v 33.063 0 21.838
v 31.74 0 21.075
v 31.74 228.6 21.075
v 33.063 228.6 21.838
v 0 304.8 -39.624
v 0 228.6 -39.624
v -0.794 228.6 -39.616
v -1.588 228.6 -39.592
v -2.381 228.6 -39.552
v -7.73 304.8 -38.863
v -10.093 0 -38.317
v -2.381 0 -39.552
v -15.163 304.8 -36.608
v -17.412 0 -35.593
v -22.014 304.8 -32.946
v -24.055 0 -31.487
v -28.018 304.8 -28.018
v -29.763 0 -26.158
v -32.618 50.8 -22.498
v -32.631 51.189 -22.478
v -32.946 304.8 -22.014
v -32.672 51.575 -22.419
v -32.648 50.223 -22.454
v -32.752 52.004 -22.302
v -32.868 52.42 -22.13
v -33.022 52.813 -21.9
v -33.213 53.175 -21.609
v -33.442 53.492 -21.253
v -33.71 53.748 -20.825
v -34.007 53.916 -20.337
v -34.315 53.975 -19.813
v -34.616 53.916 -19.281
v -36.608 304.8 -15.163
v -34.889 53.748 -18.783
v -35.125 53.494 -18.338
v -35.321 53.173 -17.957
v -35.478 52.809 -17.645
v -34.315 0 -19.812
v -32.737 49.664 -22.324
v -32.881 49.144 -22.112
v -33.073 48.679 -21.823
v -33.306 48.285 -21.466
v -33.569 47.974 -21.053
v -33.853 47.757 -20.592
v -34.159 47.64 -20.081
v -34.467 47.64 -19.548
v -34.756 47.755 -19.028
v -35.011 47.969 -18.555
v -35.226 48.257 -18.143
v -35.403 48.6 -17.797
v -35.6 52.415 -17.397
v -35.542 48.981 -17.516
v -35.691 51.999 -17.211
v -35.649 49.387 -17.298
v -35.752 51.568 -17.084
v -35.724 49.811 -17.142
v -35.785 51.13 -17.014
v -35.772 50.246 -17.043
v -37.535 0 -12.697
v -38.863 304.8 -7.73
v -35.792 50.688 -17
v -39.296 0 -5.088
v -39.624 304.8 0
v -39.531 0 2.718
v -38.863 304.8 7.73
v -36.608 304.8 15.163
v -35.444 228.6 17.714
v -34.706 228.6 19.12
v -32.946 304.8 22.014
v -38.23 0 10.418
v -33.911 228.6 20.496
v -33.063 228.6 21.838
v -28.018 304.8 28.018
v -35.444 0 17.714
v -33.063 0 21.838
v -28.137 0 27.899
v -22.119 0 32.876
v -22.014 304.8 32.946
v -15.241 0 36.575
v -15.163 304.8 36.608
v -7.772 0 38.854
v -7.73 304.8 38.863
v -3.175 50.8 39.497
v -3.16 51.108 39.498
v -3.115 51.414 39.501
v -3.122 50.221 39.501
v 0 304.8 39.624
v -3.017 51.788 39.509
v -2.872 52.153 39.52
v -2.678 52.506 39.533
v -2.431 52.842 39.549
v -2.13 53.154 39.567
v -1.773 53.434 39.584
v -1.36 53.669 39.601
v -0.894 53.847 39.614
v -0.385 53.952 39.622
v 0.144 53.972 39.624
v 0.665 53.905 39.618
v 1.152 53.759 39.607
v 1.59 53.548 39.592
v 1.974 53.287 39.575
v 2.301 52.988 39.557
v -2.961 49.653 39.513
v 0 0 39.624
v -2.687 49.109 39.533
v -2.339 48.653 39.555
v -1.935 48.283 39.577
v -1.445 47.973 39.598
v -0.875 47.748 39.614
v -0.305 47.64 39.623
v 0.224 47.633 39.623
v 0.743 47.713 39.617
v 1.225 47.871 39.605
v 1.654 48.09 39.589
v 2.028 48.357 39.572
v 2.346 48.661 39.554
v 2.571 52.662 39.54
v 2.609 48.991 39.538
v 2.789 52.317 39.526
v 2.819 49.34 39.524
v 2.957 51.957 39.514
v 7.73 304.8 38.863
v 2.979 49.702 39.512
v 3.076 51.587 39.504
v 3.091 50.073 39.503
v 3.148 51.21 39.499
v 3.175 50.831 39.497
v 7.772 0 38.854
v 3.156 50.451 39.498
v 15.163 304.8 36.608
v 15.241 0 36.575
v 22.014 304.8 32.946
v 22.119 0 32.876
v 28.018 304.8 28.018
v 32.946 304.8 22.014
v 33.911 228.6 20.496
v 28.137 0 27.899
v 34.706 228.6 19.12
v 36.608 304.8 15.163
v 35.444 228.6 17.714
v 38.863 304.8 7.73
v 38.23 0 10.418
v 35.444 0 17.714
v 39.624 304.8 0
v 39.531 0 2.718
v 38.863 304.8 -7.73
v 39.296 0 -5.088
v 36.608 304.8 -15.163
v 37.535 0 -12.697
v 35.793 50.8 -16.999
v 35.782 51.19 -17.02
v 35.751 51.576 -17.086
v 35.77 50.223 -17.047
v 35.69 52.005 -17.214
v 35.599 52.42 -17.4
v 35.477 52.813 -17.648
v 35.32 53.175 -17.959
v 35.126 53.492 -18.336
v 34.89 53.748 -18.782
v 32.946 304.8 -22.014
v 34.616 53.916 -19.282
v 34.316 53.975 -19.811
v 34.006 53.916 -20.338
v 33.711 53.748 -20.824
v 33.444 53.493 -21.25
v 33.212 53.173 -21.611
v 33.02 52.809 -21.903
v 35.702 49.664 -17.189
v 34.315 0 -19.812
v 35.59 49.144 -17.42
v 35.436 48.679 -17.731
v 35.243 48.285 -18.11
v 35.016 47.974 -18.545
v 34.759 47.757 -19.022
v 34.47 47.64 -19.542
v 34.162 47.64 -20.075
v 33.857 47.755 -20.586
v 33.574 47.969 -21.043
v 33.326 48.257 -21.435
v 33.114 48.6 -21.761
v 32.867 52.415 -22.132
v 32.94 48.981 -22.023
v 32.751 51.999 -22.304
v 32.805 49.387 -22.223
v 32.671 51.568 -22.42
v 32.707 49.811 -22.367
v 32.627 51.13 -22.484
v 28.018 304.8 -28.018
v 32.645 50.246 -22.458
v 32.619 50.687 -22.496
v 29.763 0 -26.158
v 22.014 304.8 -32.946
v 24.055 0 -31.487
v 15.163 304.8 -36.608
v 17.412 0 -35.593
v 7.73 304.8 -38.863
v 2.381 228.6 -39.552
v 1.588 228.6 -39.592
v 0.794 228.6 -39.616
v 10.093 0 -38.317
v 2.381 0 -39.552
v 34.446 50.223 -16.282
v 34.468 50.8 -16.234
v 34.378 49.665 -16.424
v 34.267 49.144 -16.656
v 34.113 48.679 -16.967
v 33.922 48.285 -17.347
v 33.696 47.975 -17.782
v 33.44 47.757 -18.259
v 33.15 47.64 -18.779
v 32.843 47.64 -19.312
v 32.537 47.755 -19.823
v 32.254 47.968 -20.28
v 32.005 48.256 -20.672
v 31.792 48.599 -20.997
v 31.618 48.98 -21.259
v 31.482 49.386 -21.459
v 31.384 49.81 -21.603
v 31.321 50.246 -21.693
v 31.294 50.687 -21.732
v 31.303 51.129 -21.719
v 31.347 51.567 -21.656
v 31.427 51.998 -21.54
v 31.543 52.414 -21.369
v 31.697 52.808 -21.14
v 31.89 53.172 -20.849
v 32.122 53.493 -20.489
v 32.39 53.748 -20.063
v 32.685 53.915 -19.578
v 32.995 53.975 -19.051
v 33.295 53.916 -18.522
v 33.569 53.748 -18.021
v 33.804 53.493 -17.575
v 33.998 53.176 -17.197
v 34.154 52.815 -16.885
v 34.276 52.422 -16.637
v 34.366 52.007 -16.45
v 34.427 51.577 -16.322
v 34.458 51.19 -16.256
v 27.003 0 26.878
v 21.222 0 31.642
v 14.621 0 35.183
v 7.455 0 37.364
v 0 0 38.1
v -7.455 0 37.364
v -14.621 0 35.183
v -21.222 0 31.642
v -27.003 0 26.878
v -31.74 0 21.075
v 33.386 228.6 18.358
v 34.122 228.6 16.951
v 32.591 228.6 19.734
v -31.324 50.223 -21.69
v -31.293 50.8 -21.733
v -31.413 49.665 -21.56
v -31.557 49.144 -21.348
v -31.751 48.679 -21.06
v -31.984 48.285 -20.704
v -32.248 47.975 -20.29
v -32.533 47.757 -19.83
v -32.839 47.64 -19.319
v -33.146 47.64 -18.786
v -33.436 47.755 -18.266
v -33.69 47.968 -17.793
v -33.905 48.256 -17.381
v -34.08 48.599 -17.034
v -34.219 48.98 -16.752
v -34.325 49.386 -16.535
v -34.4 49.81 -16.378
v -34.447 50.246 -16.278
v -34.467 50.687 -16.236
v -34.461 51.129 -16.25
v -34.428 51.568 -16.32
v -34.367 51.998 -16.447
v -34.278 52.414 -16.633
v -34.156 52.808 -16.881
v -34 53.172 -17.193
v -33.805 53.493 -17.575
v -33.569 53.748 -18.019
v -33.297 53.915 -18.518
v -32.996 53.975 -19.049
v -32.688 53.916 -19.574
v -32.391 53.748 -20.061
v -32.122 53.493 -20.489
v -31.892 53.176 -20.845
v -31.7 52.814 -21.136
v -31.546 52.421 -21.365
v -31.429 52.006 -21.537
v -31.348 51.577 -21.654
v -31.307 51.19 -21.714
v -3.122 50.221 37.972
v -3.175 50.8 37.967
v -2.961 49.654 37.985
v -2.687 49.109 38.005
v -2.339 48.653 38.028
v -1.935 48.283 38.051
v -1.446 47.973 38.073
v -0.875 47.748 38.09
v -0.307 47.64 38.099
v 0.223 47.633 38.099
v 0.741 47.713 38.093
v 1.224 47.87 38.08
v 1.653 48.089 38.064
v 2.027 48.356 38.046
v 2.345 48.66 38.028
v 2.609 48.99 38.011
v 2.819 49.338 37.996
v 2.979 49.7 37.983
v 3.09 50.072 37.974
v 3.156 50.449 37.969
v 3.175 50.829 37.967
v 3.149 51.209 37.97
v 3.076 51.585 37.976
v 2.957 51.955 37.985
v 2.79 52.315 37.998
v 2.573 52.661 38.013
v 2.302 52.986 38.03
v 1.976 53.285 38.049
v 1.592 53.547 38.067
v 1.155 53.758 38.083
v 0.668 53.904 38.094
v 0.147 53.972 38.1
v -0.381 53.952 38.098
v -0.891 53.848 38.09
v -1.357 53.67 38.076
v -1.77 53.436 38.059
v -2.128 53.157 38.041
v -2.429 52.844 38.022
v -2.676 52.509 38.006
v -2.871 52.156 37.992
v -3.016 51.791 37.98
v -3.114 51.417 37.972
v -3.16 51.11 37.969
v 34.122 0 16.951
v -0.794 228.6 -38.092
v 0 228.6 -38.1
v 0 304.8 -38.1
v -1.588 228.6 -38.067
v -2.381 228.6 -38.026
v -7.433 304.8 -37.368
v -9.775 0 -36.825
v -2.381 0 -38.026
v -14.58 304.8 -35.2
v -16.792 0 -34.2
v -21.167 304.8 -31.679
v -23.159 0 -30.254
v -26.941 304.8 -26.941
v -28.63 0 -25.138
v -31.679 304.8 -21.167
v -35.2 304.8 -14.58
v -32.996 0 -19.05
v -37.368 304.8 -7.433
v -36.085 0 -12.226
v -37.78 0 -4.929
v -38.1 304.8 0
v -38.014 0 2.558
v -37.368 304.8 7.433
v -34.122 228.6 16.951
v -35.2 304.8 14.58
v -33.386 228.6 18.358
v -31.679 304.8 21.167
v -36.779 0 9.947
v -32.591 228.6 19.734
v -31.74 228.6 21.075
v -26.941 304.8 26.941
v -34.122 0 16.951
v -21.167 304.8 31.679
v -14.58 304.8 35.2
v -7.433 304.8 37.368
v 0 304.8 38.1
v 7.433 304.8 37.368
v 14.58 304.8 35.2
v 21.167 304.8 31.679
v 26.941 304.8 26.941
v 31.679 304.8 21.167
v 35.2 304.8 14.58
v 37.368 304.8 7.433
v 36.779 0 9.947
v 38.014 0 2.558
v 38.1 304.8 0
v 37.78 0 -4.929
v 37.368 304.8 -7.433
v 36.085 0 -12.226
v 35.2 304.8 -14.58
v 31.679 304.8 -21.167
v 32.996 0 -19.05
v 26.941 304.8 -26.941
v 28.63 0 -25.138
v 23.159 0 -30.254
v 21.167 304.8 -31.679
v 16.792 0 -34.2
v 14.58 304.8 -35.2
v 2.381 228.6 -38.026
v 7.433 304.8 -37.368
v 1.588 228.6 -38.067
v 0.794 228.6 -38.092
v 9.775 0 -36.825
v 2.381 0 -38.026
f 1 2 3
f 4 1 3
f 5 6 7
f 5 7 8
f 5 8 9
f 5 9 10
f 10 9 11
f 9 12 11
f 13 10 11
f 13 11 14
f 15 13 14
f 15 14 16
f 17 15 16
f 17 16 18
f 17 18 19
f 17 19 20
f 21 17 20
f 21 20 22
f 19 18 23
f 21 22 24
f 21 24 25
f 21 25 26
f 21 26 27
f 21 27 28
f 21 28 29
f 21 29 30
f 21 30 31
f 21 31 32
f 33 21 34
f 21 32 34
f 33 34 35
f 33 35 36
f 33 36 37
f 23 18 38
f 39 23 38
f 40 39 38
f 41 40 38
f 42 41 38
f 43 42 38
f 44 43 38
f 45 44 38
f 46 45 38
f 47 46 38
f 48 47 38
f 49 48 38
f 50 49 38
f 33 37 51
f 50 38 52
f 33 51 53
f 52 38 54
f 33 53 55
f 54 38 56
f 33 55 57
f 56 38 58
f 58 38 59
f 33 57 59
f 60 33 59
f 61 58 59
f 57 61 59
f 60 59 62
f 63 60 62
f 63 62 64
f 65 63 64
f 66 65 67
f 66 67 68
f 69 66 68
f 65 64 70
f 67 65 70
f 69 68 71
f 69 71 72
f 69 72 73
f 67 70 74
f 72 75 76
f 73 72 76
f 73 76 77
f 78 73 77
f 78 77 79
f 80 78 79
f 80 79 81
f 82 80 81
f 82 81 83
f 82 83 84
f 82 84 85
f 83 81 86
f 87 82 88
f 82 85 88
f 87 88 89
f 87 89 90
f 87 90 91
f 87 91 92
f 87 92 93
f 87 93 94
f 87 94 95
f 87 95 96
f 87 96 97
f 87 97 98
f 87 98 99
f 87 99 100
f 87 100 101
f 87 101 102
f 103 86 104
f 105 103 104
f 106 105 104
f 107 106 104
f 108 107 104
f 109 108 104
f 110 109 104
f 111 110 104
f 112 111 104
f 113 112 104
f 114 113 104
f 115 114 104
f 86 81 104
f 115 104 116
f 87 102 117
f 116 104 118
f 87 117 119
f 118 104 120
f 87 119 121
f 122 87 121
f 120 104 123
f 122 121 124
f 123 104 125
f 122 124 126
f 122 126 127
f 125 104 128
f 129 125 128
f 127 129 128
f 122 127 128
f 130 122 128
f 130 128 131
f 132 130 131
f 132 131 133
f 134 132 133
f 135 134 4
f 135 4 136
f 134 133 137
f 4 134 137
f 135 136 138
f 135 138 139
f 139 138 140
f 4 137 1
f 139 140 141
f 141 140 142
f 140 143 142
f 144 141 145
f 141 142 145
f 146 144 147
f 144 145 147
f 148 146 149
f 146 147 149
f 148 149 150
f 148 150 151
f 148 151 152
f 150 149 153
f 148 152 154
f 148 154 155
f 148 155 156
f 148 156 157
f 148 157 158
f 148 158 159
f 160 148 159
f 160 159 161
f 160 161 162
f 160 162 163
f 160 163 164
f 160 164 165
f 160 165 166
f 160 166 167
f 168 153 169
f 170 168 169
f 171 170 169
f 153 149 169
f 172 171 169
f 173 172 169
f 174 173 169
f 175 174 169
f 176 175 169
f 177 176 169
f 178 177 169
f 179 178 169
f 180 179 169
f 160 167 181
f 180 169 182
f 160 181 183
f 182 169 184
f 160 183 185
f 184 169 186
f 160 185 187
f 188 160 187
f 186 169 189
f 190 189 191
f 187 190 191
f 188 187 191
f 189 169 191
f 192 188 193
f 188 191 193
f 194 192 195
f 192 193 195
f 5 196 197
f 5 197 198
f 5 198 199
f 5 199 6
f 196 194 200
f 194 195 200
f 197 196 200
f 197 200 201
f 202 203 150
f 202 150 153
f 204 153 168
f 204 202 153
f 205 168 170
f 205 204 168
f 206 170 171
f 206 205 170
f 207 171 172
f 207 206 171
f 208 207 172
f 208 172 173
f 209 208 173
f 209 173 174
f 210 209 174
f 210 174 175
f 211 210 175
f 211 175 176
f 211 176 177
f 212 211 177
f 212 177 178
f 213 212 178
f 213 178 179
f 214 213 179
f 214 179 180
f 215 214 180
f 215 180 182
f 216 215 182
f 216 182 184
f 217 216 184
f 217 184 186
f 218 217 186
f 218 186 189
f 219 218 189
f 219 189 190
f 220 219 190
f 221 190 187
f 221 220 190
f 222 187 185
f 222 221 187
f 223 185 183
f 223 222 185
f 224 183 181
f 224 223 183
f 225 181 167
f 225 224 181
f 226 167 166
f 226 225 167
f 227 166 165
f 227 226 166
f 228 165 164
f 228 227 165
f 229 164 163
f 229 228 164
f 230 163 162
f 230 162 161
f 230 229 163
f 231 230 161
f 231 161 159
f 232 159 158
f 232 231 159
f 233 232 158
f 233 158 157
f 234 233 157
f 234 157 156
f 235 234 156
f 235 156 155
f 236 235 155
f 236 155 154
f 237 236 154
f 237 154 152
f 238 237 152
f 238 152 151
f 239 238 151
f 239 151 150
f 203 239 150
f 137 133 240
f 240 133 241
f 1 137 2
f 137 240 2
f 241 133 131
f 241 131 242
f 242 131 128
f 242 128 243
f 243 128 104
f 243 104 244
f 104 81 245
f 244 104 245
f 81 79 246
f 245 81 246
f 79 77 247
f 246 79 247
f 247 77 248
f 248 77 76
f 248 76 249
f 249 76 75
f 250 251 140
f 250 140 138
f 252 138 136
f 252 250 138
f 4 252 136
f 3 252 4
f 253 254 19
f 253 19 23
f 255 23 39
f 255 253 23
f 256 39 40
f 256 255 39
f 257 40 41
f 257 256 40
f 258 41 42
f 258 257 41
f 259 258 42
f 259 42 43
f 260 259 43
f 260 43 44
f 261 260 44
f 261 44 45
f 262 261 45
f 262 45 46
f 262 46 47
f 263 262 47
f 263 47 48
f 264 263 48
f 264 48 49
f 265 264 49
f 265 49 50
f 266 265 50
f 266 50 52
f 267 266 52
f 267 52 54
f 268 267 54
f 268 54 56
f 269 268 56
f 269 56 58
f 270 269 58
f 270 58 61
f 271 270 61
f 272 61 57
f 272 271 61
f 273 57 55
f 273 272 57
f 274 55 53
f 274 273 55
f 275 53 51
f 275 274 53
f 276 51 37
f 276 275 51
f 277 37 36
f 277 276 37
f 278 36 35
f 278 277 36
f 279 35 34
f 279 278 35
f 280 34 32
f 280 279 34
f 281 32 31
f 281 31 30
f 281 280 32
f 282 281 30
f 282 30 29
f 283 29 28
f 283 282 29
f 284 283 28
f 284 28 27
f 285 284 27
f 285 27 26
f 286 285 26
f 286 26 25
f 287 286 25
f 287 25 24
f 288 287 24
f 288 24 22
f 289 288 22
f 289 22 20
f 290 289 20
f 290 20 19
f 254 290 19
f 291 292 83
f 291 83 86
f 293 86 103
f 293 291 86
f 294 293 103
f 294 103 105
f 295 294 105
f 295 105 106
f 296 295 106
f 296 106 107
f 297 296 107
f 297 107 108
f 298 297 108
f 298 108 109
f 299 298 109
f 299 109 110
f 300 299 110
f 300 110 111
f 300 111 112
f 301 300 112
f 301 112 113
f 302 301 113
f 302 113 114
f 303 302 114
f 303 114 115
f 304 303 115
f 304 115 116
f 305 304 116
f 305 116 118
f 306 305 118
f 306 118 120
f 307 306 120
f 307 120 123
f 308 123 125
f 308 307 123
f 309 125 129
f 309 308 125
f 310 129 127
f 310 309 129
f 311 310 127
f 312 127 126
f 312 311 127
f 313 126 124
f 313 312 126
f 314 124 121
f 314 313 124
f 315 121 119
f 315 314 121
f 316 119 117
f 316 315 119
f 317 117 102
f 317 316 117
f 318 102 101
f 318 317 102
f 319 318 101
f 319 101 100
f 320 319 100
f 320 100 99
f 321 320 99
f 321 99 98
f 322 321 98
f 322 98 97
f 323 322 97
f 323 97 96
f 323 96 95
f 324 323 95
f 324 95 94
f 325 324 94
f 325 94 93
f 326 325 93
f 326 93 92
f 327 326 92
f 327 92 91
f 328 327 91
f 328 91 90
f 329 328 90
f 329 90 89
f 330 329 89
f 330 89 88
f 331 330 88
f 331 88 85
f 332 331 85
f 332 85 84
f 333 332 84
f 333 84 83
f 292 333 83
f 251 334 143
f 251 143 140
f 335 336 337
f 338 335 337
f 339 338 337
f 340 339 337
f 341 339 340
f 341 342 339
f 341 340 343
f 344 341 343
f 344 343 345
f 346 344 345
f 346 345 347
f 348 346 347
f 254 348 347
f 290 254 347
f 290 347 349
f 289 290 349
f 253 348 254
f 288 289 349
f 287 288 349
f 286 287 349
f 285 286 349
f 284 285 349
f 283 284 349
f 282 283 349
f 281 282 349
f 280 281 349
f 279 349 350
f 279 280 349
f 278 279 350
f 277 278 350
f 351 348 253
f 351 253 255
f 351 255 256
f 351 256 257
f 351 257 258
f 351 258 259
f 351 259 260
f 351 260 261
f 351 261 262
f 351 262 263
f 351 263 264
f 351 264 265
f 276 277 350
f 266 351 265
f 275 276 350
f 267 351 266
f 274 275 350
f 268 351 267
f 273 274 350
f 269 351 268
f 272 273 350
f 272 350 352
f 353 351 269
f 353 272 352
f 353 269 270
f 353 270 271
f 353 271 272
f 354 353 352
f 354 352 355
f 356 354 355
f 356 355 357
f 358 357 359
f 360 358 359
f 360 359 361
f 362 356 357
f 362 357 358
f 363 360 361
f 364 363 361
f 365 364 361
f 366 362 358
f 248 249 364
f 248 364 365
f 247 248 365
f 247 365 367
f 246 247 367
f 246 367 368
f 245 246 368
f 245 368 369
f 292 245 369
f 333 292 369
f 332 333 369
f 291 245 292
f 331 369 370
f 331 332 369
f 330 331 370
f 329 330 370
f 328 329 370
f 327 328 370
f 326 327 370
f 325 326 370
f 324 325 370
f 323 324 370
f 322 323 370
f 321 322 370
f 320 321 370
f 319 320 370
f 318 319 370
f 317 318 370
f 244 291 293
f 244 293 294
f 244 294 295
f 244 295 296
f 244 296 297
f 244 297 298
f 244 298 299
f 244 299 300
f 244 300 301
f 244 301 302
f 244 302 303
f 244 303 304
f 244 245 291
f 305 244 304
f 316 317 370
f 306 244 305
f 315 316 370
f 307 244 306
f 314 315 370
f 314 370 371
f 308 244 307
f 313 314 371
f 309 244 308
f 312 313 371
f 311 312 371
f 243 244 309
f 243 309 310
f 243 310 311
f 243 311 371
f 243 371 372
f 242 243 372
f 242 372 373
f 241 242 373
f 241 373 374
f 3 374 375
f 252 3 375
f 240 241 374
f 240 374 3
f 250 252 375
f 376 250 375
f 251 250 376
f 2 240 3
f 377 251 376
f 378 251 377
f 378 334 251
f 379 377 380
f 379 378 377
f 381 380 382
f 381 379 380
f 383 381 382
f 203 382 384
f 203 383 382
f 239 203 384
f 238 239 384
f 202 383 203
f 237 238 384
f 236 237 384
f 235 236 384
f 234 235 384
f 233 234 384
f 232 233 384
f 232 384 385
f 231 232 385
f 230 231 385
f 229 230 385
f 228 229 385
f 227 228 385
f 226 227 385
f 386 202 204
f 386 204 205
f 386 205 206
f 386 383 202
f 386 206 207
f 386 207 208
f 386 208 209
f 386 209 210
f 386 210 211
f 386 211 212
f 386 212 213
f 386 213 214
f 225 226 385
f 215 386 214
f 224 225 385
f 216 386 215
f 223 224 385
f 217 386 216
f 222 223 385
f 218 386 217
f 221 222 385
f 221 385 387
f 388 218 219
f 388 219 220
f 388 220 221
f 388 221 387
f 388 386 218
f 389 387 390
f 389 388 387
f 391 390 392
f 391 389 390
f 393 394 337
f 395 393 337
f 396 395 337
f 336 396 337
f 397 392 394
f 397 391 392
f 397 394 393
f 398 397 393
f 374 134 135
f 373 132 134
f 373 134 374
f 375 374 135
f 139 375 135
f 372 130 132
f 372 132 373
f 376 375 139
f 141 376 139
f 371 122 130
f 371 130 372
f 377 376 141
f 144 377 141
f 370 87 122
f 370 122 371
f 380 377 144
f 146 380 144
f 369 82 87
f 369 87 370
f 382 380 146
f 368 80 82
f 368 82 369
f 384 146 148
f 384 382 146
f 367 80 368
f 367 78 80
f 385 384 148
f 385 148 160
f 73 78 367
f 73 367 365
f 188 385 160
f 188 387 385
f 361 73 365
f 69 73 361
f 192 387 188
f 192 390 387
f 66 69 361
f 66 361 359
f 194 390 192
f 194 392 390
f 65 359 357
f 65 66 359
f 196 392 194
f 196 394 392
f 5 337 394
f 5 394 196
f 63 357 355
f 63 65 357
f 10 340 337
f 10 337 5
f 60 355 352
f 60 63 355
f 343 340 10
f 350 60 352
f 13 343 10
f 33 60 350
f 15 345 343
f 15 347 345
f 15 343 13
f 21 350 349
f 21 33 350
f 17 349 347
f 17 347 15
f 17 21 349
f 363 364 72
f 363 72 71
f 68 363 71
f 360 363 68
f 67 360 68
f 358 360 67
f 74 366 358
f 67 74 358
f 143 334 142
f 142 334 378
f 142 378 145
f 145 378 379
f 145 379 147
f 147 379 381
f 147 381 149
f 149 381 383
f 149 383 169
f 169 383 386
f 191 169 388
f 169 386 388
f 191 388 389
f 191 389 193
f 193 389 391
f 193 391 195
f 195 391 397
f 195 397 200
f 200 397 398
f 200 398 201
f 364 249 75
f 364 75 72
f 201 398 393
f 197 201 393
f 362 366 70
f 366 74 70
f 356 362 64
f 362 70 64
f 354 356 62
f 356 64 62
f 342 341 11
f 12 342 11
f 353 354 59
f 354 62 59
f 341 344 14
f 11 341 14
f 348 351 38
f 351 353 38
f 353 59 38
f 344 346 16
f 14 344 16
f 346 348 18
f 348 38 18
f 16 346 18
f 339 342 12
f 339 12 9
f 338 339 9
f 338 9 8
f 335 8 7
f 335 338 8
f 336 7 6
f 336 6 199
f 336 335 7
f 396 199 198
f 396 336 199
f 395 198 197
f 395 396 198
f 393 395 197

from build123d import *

# Parameters (mm, degrees)
SKETCH2_R           = 39.624
SKETCH2_R_2         = 38.1
BOSS_EXTRUDE1_DEPTH = 304.8
SKETCH3_W           = 4.7625
SKETCH3_H           = 228.6
CUT_EXTRUDE1_DEPTH  = 310.908313461
CIRPATTERN1_COUNT   = 3
SKETCH4_R           = 3.175
CUT_EXTRUDE3_DEPTH  = 310.908313461
CIRPATTERN2_COUNT   = 3


with BuildPart() as part:
    # Sketch2 → Boss-Extrude1 (new body)
    with BuildSketch(Plane(origin=(0, 0, 0), x_dir=(1, 0, 0), z_dir=(0, 1, 0))):
        with Locations(Location((0, 0, 0), (0, 0, 90))):
            Circle(SKETCH2_R)
        with Locations(Location((0, 0, 0), (0, 0, 90))):
            Circle(SKETCH2_R_2, mode=Mode.SUBTRACT)
    extrude(amount=BOSS_EXTRUDE1_DEPTH)

    # Sketch3 → Cut-Extrude1 (cut, through all)
    with BuildSketch(Plane.XY):
        with Locations((0, 114.3)):
            Rectangle(SKETCH3_W, SKETCH3_H)
    cut_extrude1 = extrude(amount=-CUT_EXTRUDE1_DEPTH, mode=Mode.SUBTRACT)

    # CirPattern1: Cut-Extrude1 ×3 about axis
    cirpattern1_axis = Axis((0, 0, 0), (0, 1, 0))
    for i in range(1, CIRPATTERN1_COUNT):
        add(cut_extrude1.rotate(cirpattern1_axis, i * 360 / CIRPATTERN1_COUNT), mode=Mode.SUBTRACT)

    # Sketch4 → Cut-Extrude3 (cut, through all)
    with BuildSketch(Plane.XY):
        with Locations(Location((0, 50.8, 0), (0, 0, 180))):
            Circle(SKETCH4_R)
    cut_extrude3 = extrude(amount=CUT_EXTRUDE3_DEPTH, mode=Mode.SUBTRACT)

    # CirPattern2: Cut-Extrude3 ×3 about axis
    cirpattern2_axis = Axis((0, 304.8, 0), (0, -1, 0))
    for i in range(1, CIRPATTERN2_COUNT):
        add(cut_extrude3.rotate(cirpattern2_axis, i * 360 / CIRPATTERN2_COUNT), mode=Mode.SUBTRACT)


solid = part.part
